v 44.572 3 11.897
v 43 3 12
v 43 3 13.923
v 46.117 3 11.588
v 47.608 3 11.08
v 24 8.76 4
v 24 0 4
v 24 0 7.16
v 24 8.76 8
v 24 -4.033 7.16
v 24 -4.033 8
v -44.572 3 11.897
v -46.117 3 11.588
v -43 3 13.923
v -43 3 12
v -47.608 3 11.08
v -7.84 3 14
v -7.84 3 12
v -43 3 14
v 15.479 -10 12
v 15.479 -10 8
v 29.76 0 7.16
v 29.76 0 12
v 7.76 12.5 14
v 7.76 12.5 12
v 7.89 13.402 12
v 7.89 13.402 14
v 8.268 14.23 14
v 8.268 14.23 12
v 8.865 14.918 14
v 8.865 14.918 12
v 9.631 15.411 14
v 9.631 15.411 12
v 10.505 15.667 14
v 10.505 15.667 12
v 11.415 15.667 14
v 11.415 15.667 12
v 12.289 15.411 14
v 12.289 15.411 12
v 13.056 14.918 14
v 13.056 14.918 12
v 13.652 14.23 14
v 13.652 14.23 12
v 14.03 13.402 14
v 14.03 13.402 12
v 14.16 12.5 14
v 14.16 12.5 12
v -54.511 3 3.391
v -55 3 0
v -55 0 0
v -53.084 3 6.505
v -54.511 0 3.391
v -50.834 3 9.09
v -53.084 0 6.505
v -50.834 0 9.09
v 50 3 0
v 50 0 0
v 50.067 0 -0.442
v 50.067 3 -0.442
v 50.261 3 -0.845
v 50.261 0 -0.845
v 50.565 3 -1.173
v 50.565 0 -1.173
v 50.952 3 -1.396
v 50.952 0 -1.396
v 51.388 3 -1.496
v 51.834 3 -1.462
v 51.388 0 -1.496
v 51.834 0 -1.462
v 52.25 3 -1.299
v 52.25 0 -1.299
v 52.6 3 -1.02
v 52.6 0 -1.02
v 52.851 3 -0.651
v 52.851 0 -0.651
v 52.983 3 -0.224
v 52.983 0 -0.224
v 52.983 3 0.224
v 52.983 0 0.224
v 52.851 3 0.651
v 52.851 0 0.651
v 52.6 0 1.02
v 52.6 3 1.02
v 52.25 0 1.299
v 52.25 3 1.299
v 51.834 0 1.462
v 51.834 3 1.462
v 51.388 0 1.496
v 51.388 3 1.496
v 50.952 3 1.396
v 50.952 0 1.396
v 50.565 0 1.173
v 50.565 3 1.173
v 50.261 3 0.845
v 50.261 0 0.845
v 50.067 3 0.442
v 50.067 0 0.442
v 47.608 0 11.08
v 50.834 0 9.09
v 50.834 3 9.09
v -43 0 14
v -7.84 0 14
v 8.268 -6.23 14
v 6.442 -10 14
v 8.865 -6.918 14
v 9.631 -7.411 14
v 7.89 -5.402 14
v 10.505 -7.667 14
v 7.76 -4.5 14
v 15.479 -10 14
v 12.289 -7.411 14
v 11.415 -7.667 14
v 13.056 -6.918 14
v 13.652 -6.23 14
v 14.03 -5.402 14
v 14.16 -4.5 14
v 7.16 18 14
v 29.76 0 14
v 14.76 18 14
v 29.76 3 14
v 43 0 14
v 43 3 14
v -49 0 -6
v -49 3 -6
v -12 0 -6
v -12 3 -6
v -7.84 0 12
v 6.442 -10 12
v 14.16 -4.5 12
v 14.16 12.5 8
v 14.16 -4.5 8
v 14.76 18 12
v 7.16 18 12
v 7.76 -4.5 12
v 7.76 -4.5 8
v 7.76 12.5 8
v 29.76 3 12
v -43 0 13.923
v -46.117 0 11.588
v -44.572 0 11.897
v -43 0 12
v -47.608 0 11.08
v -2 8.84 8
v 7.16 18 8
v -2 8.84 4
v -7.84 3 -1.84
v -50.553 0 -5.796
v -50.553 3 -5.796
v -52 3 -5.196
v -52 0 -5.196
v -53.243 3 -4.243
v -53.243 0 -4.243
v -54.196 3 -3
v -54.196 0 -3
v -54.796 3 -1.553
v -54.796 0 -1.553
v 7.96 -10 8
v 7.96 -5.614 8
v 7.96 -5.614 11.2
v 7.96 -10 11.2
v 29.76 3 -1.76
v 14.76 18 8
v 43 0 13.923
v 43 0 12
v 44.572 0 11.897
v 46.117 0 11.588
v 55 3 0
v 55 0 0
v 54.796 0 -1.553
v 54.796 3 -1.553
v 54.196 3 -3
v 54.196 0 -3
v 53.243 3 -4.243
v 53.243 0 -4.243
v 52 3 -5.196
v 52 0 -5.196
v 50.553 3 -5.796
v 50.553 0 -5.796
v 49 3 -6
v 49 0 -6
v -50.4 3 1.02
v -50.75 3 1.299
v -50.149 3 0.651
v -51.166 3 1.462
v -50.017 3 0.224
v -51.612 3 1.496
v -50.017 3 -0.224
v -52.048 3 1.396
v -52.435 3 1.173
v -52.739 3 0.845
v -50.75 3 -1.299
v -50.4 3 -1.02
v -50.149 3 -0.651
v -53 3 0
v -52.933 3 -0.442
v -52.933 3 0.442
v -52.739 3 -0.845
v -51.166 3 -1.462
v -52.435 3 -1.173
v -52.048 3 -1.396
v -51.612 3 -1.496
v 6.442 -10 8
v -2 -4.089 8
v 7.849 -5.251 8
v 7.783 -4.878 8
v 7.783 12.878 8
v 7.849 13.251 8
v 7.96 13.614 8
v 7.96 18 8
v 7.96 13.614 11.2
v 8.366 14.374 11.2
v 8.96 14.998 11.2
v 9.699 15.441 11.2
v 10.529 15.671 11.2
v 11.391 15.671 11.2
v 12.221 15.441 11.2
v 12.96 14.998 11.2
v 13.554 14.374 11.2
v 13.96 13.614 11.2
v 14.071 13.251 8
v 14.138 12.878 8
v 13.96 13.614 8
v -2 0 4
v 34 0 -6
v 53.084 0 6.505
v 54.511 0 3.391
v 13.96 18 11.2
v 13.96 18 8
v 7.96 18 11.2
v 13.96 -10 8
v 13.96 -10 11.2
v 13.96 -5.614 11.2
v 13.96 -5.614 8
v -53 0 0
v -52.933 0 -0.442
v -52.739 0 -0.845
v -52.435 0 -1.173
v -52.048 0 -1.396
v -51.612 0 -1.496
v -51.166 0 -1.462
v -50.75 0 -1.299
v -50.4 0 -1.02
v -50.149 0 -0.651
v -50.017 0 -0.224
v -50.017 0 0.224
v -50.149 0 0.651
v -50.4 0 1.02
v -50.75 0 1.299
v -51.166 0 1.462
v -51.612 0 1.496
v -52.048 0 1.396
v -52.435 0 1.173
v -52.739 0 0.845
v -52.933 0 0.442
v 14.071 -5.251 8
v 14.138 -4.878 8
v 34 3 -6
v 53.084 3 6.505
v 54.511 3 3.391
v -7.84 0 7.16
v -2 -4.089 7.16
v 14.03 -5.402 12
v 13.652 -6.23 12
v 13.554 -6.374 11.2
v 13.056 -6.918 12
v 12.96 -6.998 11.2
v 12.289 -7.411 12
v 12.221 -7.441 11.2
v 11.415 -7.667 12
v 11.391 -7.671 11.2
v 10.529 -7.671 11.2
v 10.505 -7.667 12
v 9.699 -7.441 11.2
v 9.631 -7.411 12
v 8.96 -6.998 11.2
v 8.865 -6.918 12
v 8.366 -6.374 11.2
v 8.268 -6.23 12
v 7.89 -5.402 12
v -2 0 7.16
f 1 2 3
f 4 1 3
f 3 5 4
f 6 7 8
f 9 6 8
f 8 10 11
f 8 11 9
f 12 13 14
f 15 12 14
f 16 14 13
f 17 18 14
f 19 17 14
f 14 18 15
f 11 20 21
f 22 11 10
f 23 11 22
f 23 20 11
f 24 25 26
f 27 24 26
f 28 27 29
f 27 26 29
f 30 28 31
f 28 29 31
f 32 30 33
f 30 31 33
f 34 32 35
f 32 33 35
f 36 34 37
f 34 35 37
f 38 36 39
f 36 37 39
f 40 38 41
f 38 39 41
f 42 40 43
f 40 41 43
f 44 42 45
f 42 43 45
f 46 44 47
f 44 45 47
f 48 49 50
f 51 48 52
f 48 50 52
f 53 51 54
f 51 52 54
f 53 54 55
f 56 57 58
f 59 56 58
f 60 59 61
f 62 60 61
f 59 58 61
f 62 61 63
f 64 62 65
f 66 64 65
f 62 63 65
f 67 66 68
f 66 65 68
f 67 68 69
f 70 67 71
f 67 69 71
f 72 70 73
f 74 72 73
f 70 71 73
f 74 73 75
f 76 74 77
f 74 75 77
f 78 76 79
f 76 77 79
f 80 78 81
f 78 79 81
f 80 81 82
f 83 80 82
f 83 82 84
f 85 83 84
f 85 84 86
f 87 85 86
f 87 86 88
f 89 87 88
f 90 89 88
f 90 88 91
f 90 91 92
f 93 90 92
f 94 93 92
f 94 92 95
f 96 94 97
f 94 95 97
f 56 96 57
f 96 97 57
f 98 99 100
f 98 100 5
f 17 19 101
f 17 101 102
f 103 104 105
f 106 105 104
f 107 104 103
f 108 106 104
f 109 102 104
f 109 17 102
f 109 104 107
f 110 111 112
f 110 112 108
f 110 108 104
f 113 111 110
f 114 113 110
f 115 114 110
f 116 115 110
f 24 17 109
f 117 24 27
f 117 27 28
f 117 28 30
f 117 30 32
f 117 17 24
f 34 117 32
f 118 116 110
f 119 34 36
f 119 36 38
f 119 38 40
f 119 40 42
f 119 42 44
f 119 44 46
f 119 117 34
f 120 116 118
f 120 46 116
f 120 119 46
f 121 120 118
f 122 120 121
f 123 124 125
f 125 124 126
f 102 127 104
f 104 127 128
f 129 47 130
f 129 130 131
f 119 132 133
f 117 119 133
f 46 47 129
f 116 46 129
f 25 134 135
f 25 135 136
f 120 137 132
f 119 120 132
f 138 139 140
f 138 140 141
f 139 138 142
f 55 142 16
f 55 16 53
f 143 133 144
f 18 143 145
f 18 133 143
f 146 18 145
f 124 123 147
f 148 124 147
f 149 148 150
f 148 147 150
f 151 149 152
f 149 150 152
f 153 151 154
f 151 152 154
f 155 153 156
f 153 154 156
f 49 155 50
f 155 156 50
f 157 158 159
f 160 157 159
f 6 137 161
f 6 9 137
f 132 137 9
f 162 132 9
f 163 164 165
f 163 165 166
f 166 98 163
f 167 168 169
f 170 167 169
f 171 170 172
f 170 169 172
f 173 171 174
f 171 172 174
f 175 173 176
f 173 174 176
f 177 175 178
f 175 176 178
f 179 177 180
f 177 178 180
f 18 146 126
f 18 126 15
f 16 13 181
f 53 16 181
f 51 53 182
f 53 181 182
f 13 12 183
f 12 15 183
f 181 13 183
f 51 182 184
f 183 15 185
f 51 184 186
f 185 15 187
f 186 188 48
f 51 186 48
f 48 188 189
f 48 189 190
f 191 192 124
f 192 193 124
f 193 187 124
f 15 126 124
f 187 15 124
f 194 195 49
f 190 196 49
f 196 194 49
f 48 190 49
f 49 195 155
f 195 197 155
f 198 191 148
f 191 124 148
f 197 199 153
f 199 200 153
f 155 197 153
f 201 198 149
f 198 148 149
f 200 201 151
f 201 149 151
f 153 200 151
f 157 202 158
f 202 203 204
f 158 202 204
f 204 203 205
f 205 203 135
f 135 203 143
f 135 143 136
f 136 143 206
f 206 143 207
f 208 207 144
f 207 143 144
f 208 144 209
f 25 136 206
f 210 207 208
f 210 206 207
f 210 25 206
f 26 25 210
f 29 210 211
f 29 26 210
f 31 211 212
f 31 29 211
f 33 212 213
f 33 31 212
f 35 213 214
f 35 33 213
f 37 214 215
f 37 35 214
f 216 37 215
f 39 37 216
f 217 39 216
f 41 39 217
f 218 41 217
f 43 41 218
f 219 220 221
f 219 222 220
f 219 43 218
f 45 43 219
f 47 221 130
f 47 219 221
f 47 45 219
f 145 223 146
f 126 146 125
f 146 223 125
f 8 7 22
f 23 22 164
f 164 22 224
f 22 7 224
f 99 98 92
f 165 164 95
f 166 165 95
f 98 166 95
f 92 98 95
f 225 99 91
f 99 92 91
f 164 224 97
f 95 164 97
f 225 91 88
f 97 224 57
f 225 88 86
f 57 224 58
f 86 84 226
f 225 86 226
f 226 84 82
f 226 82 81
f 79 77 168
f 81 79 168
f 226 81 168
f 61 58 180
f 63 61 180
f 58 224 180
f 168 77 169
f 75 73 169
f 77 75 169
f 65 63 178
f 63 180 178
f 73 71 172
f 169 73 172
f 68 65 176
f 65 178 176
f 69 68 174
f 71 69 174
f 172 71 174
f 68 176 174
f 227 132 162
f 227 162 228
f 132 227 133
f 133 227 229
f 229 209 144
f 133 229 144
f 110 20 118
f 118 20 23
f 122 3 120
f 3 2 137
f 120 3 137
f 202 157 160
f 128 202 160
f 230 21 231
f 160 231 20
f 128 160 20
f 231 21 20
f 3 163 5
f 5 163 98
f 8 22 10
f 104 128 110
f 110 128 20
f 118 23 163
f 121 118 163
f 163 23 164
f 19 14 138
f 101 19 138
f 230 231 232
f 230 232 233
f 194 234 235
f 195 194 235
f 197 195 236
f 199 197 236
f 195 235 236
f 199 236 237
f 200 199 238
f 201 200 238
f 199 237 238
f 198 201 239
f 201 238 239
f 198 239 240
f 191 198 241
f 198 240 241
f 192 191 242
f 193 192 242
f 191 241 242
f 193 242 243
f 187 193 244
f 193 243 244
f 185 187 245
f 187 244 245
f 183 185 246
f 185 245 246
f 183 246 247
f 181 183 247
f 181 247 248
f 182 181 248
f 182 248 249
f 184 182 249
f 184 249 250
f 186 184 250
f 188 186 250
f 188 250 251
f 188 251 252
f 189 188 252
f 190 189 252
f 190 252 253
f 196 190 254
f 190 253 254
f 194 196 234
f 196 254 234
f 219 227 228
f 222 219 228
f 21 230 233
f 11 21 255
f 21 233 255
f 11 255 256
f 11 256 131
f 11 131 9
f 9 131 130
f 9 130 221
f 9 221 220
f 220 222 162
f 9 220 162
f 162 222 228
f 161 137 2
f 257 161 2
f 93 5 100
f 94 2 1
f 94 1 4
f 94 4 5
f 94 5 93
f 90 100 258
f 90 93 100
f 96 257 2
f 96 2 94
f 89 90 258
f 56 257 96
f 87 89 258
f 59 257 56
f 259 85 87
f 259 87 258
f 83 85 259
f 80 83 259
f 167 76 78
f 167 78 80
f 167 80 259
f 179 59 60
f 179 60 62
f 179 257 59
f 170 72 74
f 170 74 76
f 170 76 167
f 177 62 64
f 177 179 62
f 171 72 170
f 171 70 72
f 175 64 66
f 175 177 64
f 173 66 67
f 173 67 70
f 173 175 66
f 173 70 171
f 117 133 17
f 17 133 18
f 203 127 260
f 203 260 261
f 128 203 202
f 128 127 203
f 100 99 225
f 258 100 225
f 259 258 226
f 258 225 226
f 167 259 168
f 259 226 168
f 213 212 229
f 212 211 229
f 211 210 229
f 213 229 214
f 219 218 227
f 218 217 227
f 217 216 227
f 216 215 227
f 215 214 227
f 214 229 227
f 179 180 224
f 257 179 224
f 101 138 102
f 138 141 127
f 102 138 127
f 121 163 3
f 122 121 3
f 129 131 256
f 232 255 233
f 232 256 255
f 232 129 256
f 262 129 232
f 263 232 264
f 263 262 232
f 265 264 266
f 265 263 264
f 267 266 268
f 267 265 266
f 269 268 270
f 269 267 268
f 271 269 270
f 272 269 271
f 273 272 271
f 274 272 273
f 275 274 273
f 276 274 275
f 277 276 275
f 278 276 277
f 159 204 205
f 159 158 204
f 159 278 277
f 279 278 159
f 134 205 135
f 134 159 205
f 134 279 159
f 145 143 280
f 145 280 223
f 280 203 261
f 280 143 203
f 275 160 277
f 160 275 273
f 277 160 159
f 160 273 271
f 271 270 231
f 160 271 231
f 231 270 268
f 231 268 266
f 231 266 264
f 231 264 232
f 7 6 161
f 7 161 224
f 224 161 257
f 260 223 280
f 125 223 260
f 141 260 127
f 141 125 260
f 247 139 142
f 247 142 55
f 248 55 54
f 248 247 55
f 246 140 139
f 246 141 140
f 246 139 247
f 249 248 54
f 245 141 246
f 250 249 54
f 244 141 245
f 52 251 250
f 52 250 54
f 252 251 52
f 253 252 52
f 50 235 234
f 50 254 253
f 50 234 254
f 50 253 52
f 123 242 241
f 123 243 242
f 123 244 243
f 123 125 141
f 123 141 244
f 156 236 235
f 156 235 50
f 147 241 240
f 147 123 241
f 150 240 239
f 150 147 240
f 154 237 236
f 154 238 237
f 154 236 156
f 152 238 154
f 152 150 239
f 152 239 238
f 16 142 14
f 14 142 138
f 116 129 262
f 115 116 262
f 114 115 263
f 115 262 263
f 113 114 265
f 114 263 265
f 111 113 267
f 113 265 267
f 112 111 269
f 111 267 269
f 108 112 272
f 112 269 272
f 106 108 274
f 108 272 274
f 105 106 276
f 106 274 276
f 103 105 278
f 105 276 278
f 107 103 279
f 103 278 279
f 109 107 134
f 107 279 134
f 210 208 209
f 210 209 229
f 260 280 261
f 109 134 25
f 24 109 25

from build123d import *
from build123d.topology import SkipClean

# Parameters (mm, degrees)
BOSS_EXTRUDE1_DEPTH = 3
CUT_EXTRUDE1_DEPTH  = 10
CUT_EXTRUDE3_START  = 8
SKETCH8_W           = 6
SKETCH8_H           = 3
CUT_EXTRUDE3_DEPTH  = 6
BOSS_EXTRUDE4_START = 18
BOSS_EXTRUDE4_DEPTH = 28
BOSS_EXTRUDE5_DEPTH = 3
CUT_EXTRUDE4_DEPTH  = 3
CHAMFER1_SIZE       = 15
CHAMFER2_SIZE       = 15
CHAMFER2_SIZE_2     = 10.503113073
CUT_EXTRUDE5_DEPTH  = 10
CUT_EXTRUDE6_DEPTH  = 5
BOSS_EXTRUDE8_DEPTH = 2
CHAMFER3_DEPTH      = 4
CHAMFER3_2_DEPTH    = 3


with BuildPart() as part:
    # Sketch1 → Boss-Extrude1 (new body)
    with BuildSketch(Plane(origin=(0, 0, 0), x_dir=(1, 0, 0), z_dir=(0, 1, 0))):
        with BuildLine():
            ThreePointArc((-49, -6), (-53.242640687, -4.242640687), (-55, 0))
            ThreePointArc((-55, 0), (-51.485281374, -8.485281374), (-43, -12))
            Line((-43, -12), (43, -12))
            ThreePointArc((43, -12), (51.485281374, -8.485281374), (55, 0))
            ThreePointArc((55, 0), (53.242640687, -4.242640687), (49, -6))
            Line((49, -6), (-49, -6))
        make_face()
        with BuildLine():
            Line((-53, 0), (-55, 0))
            ThreePointArc((-55, 0), (-53.242640687, -4.242640687), (-49, -6))
            Line((-49, -6), (49, -6))
            ThreePointArc((49, -6), (53.242640687, -4.242640687), (55, 0))
            Line((55, 0), (53, 0))
            ThreePointArc((53, 0), (51.5, -1.5), (50, 0))
            Line((50, 0), (-50, 0))
            ThreePointArc((-50, 0), (-51.5, -1.5), (-53, 0))
        make_face()
        with BuildLine():
            Line((49, 6), (-49, 6))
            ThreePointArc((-49, 6), (-53.242640687, 4.242640687), (-55, 0))
            Line((-55, 0), (-53, 0))
            ThreePointArc((-53, 0), (-51.5, 1.5), (-50, 0))
            Line((-50, 0), (50, 0))
            ThreePointArc((50, 0), (51.5, 1.5), (53, 0))
            Line((53, 0), (55, 0))
            ThreePointArc((55, 0), (53.242640687, 4.242640687), (49, 6))
        make_face()
    extrude(amount=BOSS_EXTRUDE1_DEPTH)

    # Sketch2 → Cut-Extrude1 (cut)
    with BuildSketch(Plane(origin=(0, 3, 0), x_dir=(1, 0, 0), z_dir=(0, 1, 0))):
        Polygon((22, -8), (36, 6), (-14, 6), (0, -8), align=None)
    extrude(amount=-CUT_EXTRUDE1_DEPTH, mode=Mode.SUBTRACT)

    # Sketch8 → Cut-Extrude3 (cut)
    with BuildSketch(Plane.XY.offset(CUT_EXTRUDE3_START)):
        with Locations((10.960071178, 1.5)):
            Rectangle(SKETCH8_W, SKETCH8_H)
    extrude(amount=CUT_EXTRUDE3_DEPTH, mode=Mode.SUBTRACT)


with BuildPart() as cut_extrude3_piece_1:
    # of the separate pieces the step leaves, piece 1, a body of its own (cut_extrude3_pieces)
    add(part.part.solids().sort_by_distance((-55, 0, 0))[0])

    # Sketch9 → Boss-Extrude4 (add)
    with BuildSketch(Plane(origin=(0, 0, 0), x_dir=(1, 0, 0), z_dir=(0, 1, 0)).offset(BOSS_EXTRUDE4_START)):
        Polygon((13.960071178, -11.2), (13.960071178, -8), (14.760071178, -8), (14.760071178, -12), (7.160071178, -12), (7.160071178, -8), (7.960071178, -8), (7.960071178, -11.2), align=None)
    extrude(amount=-BOSS_EXTRUDE4_DEPTH)


with BuildPart() as cut_extrude3_piece_2:
    # of the separate pieces the step leaves, piece 2, a body of its own (cut_extrude3_pieces)
    add(part.part.solids().sort_by_distance((13.960071178, 0, 12))[0])


with BuildPart() as cut_extrude3_piece_1_1:
    add(cut_extrude3_piece_1.part)

    # Combine1: union Cut-Extrude3 piece 2
    add(cut_extrude3_piece_2.part)

    # Sketch11 → Boss-Extrude5 (add)
    with BuildSketch(Plane(origin=(0, 3, 0), x_dir=(1, 0, 0), z_dir=(0, 1, 0))):
        Polygon((-14, 6), (-12, 6), (2, -8), (0, -8), align=None)
        Polygon((20, -8), (34, 6), (36, 6), (22, -8), align=None)
    extrude(amount=-BOSS_EXTRUDE5_DEPTH)

    # Sketch13 → Cut-Extrude4 (cut)
    with BuildSketch(Plane(origin=(0, 3, 0), x_dir=(1, 0, 0), z_dir=(0, 1, 0))):
        Polygon((2, -8), (-2, -8), (-2, -4), align=None)
        Polygon((24, -4), (24, -8), (20, -8), align=None)
    extrude(amount=-CUT_EXTRUDE4_DEPTH, mode=Mode.SUBTRACT)

    # Chamfer1
    chamfer1_edges = [cut_extrude3_piece_1_1.edges().sort_by_distance(p)[0] for p in [
        (14.760071178, 3, 10),
        (7.160071178, 3, 10),
    ]]
    chamfer(chamfer1_edges, length=CHAMFER1_SIZE - 0.0001)  # a hair under: the kernel refuses the full size

    # Chamfer2
    # the kernel refuses this chamfer: 15, 10.503113073 mm, written as the material it adds along each edge
    with BuildSketch(Plane(origin=(7.160071178, 0, 12), x_dir=(-1, 0, 0), z_dir=(0, 0, -1))) as chamfer2_piece_1_section:
        Polygon((CHAMFER2_SIZE, 0), (0, -CHAMFER2_SIZE_2), (0, 0), align=None)
    chamfer2_piece_1 = extrude(amount=4, mode=Mode.PRIVATE)
    chamfer2_piece_1 = split(chamfer2_piece_1, bisect_by=Plane(origin=(-2, 0, 12), z_dir=(-1, 0, 0)), keep=Keep.TOP, mode=Mode.PRIVATE)
    add(chamfer2_piece_1)
    with BuildSketch(Plane(origin=(7.160071178, 0, 12), x_dir=(-1, 0, 0), z_dir=(0, 0, -1))) as chamfer2_piece_2_section:
        Polygon((CHAMFER2_SIZE, 0), (0, -CHAMFER2_SIZE_2), (0, 0), align=None)
    chamfer2_piece_2 = extrude(amount=4, mode=Mode.PRIVATE)
    chamfer2_piece_2 = split(chamfer2_piece_2, bisect_by=Plane(origin=(6.580035589, 0, 12.580035589), z_dir=(-0.7071067811865489, 0, 0.7071067811865461)), keep=Keep.TOP, mode=Mode.PRIVATE)
    chamfer2_piece_2 = split(chamfer2_piece_2, bisect_by=Plane(origin=(-2, 0, 12), z_dir=(1, 0, 0)), keep=Keep.TOP, mode=Mode.PRIVATE)
    add(chamfer2_piece_2)
    with BuildSketch(Plane(origin=(7.160071178, 0, 12), x_dir=(-1, 0, 0), z_dir=(0, 0, -1))) as chamfer2_piece_3_section:
        Polygon((CHAMFER2_SIZE, 0), (0, -CHAMFER2_SIZE_2), (0, 0), align=None)
    chamfer2_piece_3 = extrude(amount=42.738283454, mode=Mode.PRIVATE)
    chamfer2_piece_3 = split(chamfer2_piece_3, bisect_by=Plane(origin=(6.580035589, 0, 12.580035589), z_dir=(-0.7071067811865489, 0, 0.7071067811865461)), keep=Keep.TOP, mode=Mode.PRIVATE)
    chamfer2_piece_3 = split(chamfer2_piece_3, bisect_by=Plane(origin=(-2, 0, 12), z_dir=(-1, 0, 0)), keep=Keep.TOP, mode=Mode.PRIVATE)
    chamfer2_piece_3 = split(chamfer2_piece_3, bisect_by=Plane(origin=(7.160071178, 0, 8), z_dir=(0, 0, -1)), keep=Keep.TOP, mode=Mode.PRIVATE)
    add(chamfer2_piece_3)
    with BuildSketch(Plane(origin=(7.160071178, 0, 12), x_dir=(-1, 0, 0), z_dir=(0, 0, -1))) as chamfer2_piece_4_section:
        Polygon((CHAMFER2_SIZE, 0), (0, -CHAMFER2_SIZE_2), (0, 0), align=None)
    chamfer2_piece_4 = extrude(amount=4, mode=Mode.PRIVATE)
    chamfer2_piece_4 = split(chamfer2_piece_4, bisect_by=Plane(origin=(6.580035589, 0, 12.580035589), z_dir=(0.7071067811865489, 0, -0.7071067811865461)), keep=Keep.TOP, mode=Mode.PRIVATE)
    chamfer2_piece_4 = split(chamfer2_piece_4, bisect_by=Plane(origin=(7.160071178, -10, 12), z_dir=(0, 1, 0)), keep=Keep.TOP, mode=Mode.PRIVATE)
    add(chamfer2_piece_4)
    with BuildSketch(Plane(origin=(14.760071178, 0, 12), x_dir=(0, -1, 0), z_dir=(0, 0, -1))) as chamfer2_piece_5_section:
        Polygon((CHAMFER2_SIZE_2, 0), (0, -CHAMFER2_SIZE), (0, 0), align=None)
    chamfer2_piece_5 = extrude(amount=4, mode=Mode.PRIVATE)
    chamfer2_piece_5 = split(chamfer2_piece_5, bisect_by=Plane(origin=(15.380035589, 0, 12.619964411), z_dir=(0.7071067811865462, 0, 0.7071067811865489)), keep=Keep.TOP, mode=Mode.PRIVATE)
    chamfer2_piece_5 = split(chamfer2_piece_5, bisect_by=Plane(origin=(24, 0, 12), z_dir=(-1, 0, 0)), keep=Keep.TOP, mode=Mode.PRIVATE)
    add(chamfer2_piece_5)
    with BuildSketch(Plane(origin=(14.760071178, 0, 12), x_dir=(0, -1, 0), z_dir=(0, 0, -1))) as chamfer2_piece_6_section:
        Polygon((CHAMFER2_SIZE_2, 0), (0, -CHAMFER2_SIZE), (0, 0), align=None)
    chamfer2_piece_6 = extrude(amount=4, mode=Mode.PRIVATE)
    chamfer2_piece_6 = split(chamfer2_piece_6, bisect_by=Plane(origin=(24, 0, 12), z_dir=(1, 0, 0)), keep=Keep.TOP, mode=Mode.PRIVATE)
    add(chamfer2_piece_6)
    with BuildSketch(Plane(origin=(14.760071178, 0, 12), x_dir=(0, -1, 0), z_dir=(0, 0, -1))) as chamfer2_piece_7_section:
        Polygon((CHAMFER2_SIZE_2, 0), (0, -CHAMFER2_SIZE), (0, 0), align=None)
    chamfer2_piece_7 = extrude(amount=4, mode=Mode.PRIVATE)
    chamfer2_piece_7 = split(chamfer2_piece_7, bisect_by=Plane(origin=(14.760071178, -10, 12), z_dir=(0, 1, 0)), keep=Keep.TOP, mode=Mode.PRIVATE)
    chamfer2_piece_7 = split(chamfer2_piece_7, bisect_by=Plane(origin=(15.380035589, 0, 12.619964411), z_dir=(-0.7071067811865462, 0, -0.7071067811865489)), keep=Keep.TOP, mode=Mode.PRIVATE)
    add(chamfer2_piece_7)
    with BuildSketch(Plane(origin=(14.760071178, 0, 12), x_dir=(0, -1, 0), z_dir=(0, 0, -1))) as chamfer2_piece_8_section:
        Polygon((CHAMFER2_SIZE_2, 0), (0, -CHAMFER2_SIZE), (0, 0), align=None)
    chamfer2_piece_8 = extrude(amount=42.738283454, mode=Mode.PRIVATE)
    chamfer2_piece_8 = split(chamfer2_piece_8, bisect_by=Plane(origin=(14.760071178, 0, 8), z_dir=(0, 0, -1)), keep=Keep.TOP, mode=Mode.PRIVATE)
    chamfer2_piece_8 = split(chamfer2_piece_8, bisect_by=Plane(origin=(15.380035589, 0, 12.619964411), z_dir=(0.7071067811865462, 0, 0.7071067811865489)), keep=Keep.TOP, mode=Mode.PRIVATE)
    chamfer2_piece_8 = split(chamfer2_piece_8, bisect_by=Plane(origin=(24, 0, 12), z_dir=(1, 0, 0)), keep=Keep.TOP, mode=Mode.PRIVATE)
    add(chamfer2_piece_8)

    # Sketch15 → Cut-Extrude5 (cut)
    with BuildSketch(Plane.XY.offset(12)):
        with BuildLine():
            Line((14.160071178, 12.5), (14.160071178, -4.5))
            ThreePointArc((14.160071178, -4.5), (10.960071178, -7.7), (7.760071178, -4.5))
            Line((7.760071178, -4.5), (7.760071178, 12.5))
            ThreePointArc((7.760071178, 12.5), (10.960071178, 15.7), (14.160071178, 12.5))
        make_face()
    extrude(amount=-CUT_EXTRUDE5_DEPTH, mode=Mode.SUBTRACT)

    # Sketch16 → Cut-Extrude6 (cut)
    with BuildSketch(Plane(origin=(0, 0, 0), x_dir=(1, 0, 0), z_dir=(0, 1, 0))):
        Polygon((-7.839928822, 1.839928822), (-2, -4), (-2, -7.160071178), (-7.839928822, -7.160071178), align=None)
        Polygon((24, -7.160071178), (24, -4), (29.760071178, 1.760071178), (29.760071178, -7.160071178), align=None)
    extrude(amount=-CUT_EXTRUDE6_DEPTH, mode=Mode.SUBTRACT)

    # Sketch17 → Boss-Extrude8 (add)
    with SkipClean():  # the faces are left unmerged after this step: merging them gives an invalid solid
        with BuildSketch(Plane.XY.offset(12)):
            Polygon((-7.839928822, 0), (6.441551245, -10), (15.47859111, -10), (29.760071178, 0), (43, 0), (43, 3), (29.760071178, 3), (14.760071178, 18), (7.160071178, 18), (-7.839928822, 3), (-43, 3), (-43, 0), align=None)
            with BuildLine():
                Line((7.760071178, -4.5), (7.760071178, 12.5))
                ThreePointArc((7.760071178, 12.5), (10.960071178, 15.7), (14.160071178, 12.5))
                Line((14.160071178, 12.5), (14.160071178, -4.5))
                ThreePointArc((14.160071178, -4.5), (10.960071178, -7.7), (7.760071178, -4.5))
            make_face(mode=Mode.SUBTRACT)
        extrude(amount=BOSS_EXTRUDE8_DEPTH)

    # Chamfer3: read off the stored shape, not the designer's step
    # Chamfer3 outline → Chamfer3 (cut)
    with SkipClean():  # the faces are left unmerged after this step: merging them gives an invalid solid
        with BuildSketch(Plane(origin=(0, 0, 0), x_dir=(1, 0, 0), z_dir=(0, 1, 0))):
            with BuildLine():
                ThreePointArc((47.608318931, -11.079864468), (49.300429772, -10.212961602), (50.834384089, -9.08968789))
                Line((50.834384089, -9.08968789), (47.608318931, -11.079864468))
            make_face()
            with BuildLine():
                ThreePointArc((-50.834384089, -9.08968789), (-49.300429772, -10.212961602), (-47.608318931, -11.079864468))
                Line((-47.608318931, -11.079864468), (-50.834384089, -9.08968789))
            make_face()
        extrude(amount=CHAMFER3_DEPTH, mode=Mode.SUBTRACT)

    # Chamfer3 2 outline → Chamfer3 2 (add)
    with SkipClean():  # the faces are left unmerged after this step: merging them gives an invalid solid
        with BuildSketch(Plane(origin=(0, 0, 0), x_dir=(1, 0, 0), z_dir=(0, 1, 0))):
            with BuildLine():
                Line((43, -13.922760673), (47.608318931, -11.079864468))
                ThreePointArc((47.608318931, -11.079864468), (45.349641077, -11.767717995), (43, -12))
                Line((43, -12), (43, -13.922760673))
            make_face()
            with BuildLine():
                Line((-47.608318931, -11.079864468), (-43, -13.922760673))
                Line((-43, -13.922760673), (-43, -12))
                ThreePointArc((-43, -12), (-45.349641077, -11.767717995), (-47.608318931, -11.079864468))
            make_face()
        extrude(amount=CHAMFER3_2_DEPTH)


solid = cut_extrude3_piece_1_1.part
